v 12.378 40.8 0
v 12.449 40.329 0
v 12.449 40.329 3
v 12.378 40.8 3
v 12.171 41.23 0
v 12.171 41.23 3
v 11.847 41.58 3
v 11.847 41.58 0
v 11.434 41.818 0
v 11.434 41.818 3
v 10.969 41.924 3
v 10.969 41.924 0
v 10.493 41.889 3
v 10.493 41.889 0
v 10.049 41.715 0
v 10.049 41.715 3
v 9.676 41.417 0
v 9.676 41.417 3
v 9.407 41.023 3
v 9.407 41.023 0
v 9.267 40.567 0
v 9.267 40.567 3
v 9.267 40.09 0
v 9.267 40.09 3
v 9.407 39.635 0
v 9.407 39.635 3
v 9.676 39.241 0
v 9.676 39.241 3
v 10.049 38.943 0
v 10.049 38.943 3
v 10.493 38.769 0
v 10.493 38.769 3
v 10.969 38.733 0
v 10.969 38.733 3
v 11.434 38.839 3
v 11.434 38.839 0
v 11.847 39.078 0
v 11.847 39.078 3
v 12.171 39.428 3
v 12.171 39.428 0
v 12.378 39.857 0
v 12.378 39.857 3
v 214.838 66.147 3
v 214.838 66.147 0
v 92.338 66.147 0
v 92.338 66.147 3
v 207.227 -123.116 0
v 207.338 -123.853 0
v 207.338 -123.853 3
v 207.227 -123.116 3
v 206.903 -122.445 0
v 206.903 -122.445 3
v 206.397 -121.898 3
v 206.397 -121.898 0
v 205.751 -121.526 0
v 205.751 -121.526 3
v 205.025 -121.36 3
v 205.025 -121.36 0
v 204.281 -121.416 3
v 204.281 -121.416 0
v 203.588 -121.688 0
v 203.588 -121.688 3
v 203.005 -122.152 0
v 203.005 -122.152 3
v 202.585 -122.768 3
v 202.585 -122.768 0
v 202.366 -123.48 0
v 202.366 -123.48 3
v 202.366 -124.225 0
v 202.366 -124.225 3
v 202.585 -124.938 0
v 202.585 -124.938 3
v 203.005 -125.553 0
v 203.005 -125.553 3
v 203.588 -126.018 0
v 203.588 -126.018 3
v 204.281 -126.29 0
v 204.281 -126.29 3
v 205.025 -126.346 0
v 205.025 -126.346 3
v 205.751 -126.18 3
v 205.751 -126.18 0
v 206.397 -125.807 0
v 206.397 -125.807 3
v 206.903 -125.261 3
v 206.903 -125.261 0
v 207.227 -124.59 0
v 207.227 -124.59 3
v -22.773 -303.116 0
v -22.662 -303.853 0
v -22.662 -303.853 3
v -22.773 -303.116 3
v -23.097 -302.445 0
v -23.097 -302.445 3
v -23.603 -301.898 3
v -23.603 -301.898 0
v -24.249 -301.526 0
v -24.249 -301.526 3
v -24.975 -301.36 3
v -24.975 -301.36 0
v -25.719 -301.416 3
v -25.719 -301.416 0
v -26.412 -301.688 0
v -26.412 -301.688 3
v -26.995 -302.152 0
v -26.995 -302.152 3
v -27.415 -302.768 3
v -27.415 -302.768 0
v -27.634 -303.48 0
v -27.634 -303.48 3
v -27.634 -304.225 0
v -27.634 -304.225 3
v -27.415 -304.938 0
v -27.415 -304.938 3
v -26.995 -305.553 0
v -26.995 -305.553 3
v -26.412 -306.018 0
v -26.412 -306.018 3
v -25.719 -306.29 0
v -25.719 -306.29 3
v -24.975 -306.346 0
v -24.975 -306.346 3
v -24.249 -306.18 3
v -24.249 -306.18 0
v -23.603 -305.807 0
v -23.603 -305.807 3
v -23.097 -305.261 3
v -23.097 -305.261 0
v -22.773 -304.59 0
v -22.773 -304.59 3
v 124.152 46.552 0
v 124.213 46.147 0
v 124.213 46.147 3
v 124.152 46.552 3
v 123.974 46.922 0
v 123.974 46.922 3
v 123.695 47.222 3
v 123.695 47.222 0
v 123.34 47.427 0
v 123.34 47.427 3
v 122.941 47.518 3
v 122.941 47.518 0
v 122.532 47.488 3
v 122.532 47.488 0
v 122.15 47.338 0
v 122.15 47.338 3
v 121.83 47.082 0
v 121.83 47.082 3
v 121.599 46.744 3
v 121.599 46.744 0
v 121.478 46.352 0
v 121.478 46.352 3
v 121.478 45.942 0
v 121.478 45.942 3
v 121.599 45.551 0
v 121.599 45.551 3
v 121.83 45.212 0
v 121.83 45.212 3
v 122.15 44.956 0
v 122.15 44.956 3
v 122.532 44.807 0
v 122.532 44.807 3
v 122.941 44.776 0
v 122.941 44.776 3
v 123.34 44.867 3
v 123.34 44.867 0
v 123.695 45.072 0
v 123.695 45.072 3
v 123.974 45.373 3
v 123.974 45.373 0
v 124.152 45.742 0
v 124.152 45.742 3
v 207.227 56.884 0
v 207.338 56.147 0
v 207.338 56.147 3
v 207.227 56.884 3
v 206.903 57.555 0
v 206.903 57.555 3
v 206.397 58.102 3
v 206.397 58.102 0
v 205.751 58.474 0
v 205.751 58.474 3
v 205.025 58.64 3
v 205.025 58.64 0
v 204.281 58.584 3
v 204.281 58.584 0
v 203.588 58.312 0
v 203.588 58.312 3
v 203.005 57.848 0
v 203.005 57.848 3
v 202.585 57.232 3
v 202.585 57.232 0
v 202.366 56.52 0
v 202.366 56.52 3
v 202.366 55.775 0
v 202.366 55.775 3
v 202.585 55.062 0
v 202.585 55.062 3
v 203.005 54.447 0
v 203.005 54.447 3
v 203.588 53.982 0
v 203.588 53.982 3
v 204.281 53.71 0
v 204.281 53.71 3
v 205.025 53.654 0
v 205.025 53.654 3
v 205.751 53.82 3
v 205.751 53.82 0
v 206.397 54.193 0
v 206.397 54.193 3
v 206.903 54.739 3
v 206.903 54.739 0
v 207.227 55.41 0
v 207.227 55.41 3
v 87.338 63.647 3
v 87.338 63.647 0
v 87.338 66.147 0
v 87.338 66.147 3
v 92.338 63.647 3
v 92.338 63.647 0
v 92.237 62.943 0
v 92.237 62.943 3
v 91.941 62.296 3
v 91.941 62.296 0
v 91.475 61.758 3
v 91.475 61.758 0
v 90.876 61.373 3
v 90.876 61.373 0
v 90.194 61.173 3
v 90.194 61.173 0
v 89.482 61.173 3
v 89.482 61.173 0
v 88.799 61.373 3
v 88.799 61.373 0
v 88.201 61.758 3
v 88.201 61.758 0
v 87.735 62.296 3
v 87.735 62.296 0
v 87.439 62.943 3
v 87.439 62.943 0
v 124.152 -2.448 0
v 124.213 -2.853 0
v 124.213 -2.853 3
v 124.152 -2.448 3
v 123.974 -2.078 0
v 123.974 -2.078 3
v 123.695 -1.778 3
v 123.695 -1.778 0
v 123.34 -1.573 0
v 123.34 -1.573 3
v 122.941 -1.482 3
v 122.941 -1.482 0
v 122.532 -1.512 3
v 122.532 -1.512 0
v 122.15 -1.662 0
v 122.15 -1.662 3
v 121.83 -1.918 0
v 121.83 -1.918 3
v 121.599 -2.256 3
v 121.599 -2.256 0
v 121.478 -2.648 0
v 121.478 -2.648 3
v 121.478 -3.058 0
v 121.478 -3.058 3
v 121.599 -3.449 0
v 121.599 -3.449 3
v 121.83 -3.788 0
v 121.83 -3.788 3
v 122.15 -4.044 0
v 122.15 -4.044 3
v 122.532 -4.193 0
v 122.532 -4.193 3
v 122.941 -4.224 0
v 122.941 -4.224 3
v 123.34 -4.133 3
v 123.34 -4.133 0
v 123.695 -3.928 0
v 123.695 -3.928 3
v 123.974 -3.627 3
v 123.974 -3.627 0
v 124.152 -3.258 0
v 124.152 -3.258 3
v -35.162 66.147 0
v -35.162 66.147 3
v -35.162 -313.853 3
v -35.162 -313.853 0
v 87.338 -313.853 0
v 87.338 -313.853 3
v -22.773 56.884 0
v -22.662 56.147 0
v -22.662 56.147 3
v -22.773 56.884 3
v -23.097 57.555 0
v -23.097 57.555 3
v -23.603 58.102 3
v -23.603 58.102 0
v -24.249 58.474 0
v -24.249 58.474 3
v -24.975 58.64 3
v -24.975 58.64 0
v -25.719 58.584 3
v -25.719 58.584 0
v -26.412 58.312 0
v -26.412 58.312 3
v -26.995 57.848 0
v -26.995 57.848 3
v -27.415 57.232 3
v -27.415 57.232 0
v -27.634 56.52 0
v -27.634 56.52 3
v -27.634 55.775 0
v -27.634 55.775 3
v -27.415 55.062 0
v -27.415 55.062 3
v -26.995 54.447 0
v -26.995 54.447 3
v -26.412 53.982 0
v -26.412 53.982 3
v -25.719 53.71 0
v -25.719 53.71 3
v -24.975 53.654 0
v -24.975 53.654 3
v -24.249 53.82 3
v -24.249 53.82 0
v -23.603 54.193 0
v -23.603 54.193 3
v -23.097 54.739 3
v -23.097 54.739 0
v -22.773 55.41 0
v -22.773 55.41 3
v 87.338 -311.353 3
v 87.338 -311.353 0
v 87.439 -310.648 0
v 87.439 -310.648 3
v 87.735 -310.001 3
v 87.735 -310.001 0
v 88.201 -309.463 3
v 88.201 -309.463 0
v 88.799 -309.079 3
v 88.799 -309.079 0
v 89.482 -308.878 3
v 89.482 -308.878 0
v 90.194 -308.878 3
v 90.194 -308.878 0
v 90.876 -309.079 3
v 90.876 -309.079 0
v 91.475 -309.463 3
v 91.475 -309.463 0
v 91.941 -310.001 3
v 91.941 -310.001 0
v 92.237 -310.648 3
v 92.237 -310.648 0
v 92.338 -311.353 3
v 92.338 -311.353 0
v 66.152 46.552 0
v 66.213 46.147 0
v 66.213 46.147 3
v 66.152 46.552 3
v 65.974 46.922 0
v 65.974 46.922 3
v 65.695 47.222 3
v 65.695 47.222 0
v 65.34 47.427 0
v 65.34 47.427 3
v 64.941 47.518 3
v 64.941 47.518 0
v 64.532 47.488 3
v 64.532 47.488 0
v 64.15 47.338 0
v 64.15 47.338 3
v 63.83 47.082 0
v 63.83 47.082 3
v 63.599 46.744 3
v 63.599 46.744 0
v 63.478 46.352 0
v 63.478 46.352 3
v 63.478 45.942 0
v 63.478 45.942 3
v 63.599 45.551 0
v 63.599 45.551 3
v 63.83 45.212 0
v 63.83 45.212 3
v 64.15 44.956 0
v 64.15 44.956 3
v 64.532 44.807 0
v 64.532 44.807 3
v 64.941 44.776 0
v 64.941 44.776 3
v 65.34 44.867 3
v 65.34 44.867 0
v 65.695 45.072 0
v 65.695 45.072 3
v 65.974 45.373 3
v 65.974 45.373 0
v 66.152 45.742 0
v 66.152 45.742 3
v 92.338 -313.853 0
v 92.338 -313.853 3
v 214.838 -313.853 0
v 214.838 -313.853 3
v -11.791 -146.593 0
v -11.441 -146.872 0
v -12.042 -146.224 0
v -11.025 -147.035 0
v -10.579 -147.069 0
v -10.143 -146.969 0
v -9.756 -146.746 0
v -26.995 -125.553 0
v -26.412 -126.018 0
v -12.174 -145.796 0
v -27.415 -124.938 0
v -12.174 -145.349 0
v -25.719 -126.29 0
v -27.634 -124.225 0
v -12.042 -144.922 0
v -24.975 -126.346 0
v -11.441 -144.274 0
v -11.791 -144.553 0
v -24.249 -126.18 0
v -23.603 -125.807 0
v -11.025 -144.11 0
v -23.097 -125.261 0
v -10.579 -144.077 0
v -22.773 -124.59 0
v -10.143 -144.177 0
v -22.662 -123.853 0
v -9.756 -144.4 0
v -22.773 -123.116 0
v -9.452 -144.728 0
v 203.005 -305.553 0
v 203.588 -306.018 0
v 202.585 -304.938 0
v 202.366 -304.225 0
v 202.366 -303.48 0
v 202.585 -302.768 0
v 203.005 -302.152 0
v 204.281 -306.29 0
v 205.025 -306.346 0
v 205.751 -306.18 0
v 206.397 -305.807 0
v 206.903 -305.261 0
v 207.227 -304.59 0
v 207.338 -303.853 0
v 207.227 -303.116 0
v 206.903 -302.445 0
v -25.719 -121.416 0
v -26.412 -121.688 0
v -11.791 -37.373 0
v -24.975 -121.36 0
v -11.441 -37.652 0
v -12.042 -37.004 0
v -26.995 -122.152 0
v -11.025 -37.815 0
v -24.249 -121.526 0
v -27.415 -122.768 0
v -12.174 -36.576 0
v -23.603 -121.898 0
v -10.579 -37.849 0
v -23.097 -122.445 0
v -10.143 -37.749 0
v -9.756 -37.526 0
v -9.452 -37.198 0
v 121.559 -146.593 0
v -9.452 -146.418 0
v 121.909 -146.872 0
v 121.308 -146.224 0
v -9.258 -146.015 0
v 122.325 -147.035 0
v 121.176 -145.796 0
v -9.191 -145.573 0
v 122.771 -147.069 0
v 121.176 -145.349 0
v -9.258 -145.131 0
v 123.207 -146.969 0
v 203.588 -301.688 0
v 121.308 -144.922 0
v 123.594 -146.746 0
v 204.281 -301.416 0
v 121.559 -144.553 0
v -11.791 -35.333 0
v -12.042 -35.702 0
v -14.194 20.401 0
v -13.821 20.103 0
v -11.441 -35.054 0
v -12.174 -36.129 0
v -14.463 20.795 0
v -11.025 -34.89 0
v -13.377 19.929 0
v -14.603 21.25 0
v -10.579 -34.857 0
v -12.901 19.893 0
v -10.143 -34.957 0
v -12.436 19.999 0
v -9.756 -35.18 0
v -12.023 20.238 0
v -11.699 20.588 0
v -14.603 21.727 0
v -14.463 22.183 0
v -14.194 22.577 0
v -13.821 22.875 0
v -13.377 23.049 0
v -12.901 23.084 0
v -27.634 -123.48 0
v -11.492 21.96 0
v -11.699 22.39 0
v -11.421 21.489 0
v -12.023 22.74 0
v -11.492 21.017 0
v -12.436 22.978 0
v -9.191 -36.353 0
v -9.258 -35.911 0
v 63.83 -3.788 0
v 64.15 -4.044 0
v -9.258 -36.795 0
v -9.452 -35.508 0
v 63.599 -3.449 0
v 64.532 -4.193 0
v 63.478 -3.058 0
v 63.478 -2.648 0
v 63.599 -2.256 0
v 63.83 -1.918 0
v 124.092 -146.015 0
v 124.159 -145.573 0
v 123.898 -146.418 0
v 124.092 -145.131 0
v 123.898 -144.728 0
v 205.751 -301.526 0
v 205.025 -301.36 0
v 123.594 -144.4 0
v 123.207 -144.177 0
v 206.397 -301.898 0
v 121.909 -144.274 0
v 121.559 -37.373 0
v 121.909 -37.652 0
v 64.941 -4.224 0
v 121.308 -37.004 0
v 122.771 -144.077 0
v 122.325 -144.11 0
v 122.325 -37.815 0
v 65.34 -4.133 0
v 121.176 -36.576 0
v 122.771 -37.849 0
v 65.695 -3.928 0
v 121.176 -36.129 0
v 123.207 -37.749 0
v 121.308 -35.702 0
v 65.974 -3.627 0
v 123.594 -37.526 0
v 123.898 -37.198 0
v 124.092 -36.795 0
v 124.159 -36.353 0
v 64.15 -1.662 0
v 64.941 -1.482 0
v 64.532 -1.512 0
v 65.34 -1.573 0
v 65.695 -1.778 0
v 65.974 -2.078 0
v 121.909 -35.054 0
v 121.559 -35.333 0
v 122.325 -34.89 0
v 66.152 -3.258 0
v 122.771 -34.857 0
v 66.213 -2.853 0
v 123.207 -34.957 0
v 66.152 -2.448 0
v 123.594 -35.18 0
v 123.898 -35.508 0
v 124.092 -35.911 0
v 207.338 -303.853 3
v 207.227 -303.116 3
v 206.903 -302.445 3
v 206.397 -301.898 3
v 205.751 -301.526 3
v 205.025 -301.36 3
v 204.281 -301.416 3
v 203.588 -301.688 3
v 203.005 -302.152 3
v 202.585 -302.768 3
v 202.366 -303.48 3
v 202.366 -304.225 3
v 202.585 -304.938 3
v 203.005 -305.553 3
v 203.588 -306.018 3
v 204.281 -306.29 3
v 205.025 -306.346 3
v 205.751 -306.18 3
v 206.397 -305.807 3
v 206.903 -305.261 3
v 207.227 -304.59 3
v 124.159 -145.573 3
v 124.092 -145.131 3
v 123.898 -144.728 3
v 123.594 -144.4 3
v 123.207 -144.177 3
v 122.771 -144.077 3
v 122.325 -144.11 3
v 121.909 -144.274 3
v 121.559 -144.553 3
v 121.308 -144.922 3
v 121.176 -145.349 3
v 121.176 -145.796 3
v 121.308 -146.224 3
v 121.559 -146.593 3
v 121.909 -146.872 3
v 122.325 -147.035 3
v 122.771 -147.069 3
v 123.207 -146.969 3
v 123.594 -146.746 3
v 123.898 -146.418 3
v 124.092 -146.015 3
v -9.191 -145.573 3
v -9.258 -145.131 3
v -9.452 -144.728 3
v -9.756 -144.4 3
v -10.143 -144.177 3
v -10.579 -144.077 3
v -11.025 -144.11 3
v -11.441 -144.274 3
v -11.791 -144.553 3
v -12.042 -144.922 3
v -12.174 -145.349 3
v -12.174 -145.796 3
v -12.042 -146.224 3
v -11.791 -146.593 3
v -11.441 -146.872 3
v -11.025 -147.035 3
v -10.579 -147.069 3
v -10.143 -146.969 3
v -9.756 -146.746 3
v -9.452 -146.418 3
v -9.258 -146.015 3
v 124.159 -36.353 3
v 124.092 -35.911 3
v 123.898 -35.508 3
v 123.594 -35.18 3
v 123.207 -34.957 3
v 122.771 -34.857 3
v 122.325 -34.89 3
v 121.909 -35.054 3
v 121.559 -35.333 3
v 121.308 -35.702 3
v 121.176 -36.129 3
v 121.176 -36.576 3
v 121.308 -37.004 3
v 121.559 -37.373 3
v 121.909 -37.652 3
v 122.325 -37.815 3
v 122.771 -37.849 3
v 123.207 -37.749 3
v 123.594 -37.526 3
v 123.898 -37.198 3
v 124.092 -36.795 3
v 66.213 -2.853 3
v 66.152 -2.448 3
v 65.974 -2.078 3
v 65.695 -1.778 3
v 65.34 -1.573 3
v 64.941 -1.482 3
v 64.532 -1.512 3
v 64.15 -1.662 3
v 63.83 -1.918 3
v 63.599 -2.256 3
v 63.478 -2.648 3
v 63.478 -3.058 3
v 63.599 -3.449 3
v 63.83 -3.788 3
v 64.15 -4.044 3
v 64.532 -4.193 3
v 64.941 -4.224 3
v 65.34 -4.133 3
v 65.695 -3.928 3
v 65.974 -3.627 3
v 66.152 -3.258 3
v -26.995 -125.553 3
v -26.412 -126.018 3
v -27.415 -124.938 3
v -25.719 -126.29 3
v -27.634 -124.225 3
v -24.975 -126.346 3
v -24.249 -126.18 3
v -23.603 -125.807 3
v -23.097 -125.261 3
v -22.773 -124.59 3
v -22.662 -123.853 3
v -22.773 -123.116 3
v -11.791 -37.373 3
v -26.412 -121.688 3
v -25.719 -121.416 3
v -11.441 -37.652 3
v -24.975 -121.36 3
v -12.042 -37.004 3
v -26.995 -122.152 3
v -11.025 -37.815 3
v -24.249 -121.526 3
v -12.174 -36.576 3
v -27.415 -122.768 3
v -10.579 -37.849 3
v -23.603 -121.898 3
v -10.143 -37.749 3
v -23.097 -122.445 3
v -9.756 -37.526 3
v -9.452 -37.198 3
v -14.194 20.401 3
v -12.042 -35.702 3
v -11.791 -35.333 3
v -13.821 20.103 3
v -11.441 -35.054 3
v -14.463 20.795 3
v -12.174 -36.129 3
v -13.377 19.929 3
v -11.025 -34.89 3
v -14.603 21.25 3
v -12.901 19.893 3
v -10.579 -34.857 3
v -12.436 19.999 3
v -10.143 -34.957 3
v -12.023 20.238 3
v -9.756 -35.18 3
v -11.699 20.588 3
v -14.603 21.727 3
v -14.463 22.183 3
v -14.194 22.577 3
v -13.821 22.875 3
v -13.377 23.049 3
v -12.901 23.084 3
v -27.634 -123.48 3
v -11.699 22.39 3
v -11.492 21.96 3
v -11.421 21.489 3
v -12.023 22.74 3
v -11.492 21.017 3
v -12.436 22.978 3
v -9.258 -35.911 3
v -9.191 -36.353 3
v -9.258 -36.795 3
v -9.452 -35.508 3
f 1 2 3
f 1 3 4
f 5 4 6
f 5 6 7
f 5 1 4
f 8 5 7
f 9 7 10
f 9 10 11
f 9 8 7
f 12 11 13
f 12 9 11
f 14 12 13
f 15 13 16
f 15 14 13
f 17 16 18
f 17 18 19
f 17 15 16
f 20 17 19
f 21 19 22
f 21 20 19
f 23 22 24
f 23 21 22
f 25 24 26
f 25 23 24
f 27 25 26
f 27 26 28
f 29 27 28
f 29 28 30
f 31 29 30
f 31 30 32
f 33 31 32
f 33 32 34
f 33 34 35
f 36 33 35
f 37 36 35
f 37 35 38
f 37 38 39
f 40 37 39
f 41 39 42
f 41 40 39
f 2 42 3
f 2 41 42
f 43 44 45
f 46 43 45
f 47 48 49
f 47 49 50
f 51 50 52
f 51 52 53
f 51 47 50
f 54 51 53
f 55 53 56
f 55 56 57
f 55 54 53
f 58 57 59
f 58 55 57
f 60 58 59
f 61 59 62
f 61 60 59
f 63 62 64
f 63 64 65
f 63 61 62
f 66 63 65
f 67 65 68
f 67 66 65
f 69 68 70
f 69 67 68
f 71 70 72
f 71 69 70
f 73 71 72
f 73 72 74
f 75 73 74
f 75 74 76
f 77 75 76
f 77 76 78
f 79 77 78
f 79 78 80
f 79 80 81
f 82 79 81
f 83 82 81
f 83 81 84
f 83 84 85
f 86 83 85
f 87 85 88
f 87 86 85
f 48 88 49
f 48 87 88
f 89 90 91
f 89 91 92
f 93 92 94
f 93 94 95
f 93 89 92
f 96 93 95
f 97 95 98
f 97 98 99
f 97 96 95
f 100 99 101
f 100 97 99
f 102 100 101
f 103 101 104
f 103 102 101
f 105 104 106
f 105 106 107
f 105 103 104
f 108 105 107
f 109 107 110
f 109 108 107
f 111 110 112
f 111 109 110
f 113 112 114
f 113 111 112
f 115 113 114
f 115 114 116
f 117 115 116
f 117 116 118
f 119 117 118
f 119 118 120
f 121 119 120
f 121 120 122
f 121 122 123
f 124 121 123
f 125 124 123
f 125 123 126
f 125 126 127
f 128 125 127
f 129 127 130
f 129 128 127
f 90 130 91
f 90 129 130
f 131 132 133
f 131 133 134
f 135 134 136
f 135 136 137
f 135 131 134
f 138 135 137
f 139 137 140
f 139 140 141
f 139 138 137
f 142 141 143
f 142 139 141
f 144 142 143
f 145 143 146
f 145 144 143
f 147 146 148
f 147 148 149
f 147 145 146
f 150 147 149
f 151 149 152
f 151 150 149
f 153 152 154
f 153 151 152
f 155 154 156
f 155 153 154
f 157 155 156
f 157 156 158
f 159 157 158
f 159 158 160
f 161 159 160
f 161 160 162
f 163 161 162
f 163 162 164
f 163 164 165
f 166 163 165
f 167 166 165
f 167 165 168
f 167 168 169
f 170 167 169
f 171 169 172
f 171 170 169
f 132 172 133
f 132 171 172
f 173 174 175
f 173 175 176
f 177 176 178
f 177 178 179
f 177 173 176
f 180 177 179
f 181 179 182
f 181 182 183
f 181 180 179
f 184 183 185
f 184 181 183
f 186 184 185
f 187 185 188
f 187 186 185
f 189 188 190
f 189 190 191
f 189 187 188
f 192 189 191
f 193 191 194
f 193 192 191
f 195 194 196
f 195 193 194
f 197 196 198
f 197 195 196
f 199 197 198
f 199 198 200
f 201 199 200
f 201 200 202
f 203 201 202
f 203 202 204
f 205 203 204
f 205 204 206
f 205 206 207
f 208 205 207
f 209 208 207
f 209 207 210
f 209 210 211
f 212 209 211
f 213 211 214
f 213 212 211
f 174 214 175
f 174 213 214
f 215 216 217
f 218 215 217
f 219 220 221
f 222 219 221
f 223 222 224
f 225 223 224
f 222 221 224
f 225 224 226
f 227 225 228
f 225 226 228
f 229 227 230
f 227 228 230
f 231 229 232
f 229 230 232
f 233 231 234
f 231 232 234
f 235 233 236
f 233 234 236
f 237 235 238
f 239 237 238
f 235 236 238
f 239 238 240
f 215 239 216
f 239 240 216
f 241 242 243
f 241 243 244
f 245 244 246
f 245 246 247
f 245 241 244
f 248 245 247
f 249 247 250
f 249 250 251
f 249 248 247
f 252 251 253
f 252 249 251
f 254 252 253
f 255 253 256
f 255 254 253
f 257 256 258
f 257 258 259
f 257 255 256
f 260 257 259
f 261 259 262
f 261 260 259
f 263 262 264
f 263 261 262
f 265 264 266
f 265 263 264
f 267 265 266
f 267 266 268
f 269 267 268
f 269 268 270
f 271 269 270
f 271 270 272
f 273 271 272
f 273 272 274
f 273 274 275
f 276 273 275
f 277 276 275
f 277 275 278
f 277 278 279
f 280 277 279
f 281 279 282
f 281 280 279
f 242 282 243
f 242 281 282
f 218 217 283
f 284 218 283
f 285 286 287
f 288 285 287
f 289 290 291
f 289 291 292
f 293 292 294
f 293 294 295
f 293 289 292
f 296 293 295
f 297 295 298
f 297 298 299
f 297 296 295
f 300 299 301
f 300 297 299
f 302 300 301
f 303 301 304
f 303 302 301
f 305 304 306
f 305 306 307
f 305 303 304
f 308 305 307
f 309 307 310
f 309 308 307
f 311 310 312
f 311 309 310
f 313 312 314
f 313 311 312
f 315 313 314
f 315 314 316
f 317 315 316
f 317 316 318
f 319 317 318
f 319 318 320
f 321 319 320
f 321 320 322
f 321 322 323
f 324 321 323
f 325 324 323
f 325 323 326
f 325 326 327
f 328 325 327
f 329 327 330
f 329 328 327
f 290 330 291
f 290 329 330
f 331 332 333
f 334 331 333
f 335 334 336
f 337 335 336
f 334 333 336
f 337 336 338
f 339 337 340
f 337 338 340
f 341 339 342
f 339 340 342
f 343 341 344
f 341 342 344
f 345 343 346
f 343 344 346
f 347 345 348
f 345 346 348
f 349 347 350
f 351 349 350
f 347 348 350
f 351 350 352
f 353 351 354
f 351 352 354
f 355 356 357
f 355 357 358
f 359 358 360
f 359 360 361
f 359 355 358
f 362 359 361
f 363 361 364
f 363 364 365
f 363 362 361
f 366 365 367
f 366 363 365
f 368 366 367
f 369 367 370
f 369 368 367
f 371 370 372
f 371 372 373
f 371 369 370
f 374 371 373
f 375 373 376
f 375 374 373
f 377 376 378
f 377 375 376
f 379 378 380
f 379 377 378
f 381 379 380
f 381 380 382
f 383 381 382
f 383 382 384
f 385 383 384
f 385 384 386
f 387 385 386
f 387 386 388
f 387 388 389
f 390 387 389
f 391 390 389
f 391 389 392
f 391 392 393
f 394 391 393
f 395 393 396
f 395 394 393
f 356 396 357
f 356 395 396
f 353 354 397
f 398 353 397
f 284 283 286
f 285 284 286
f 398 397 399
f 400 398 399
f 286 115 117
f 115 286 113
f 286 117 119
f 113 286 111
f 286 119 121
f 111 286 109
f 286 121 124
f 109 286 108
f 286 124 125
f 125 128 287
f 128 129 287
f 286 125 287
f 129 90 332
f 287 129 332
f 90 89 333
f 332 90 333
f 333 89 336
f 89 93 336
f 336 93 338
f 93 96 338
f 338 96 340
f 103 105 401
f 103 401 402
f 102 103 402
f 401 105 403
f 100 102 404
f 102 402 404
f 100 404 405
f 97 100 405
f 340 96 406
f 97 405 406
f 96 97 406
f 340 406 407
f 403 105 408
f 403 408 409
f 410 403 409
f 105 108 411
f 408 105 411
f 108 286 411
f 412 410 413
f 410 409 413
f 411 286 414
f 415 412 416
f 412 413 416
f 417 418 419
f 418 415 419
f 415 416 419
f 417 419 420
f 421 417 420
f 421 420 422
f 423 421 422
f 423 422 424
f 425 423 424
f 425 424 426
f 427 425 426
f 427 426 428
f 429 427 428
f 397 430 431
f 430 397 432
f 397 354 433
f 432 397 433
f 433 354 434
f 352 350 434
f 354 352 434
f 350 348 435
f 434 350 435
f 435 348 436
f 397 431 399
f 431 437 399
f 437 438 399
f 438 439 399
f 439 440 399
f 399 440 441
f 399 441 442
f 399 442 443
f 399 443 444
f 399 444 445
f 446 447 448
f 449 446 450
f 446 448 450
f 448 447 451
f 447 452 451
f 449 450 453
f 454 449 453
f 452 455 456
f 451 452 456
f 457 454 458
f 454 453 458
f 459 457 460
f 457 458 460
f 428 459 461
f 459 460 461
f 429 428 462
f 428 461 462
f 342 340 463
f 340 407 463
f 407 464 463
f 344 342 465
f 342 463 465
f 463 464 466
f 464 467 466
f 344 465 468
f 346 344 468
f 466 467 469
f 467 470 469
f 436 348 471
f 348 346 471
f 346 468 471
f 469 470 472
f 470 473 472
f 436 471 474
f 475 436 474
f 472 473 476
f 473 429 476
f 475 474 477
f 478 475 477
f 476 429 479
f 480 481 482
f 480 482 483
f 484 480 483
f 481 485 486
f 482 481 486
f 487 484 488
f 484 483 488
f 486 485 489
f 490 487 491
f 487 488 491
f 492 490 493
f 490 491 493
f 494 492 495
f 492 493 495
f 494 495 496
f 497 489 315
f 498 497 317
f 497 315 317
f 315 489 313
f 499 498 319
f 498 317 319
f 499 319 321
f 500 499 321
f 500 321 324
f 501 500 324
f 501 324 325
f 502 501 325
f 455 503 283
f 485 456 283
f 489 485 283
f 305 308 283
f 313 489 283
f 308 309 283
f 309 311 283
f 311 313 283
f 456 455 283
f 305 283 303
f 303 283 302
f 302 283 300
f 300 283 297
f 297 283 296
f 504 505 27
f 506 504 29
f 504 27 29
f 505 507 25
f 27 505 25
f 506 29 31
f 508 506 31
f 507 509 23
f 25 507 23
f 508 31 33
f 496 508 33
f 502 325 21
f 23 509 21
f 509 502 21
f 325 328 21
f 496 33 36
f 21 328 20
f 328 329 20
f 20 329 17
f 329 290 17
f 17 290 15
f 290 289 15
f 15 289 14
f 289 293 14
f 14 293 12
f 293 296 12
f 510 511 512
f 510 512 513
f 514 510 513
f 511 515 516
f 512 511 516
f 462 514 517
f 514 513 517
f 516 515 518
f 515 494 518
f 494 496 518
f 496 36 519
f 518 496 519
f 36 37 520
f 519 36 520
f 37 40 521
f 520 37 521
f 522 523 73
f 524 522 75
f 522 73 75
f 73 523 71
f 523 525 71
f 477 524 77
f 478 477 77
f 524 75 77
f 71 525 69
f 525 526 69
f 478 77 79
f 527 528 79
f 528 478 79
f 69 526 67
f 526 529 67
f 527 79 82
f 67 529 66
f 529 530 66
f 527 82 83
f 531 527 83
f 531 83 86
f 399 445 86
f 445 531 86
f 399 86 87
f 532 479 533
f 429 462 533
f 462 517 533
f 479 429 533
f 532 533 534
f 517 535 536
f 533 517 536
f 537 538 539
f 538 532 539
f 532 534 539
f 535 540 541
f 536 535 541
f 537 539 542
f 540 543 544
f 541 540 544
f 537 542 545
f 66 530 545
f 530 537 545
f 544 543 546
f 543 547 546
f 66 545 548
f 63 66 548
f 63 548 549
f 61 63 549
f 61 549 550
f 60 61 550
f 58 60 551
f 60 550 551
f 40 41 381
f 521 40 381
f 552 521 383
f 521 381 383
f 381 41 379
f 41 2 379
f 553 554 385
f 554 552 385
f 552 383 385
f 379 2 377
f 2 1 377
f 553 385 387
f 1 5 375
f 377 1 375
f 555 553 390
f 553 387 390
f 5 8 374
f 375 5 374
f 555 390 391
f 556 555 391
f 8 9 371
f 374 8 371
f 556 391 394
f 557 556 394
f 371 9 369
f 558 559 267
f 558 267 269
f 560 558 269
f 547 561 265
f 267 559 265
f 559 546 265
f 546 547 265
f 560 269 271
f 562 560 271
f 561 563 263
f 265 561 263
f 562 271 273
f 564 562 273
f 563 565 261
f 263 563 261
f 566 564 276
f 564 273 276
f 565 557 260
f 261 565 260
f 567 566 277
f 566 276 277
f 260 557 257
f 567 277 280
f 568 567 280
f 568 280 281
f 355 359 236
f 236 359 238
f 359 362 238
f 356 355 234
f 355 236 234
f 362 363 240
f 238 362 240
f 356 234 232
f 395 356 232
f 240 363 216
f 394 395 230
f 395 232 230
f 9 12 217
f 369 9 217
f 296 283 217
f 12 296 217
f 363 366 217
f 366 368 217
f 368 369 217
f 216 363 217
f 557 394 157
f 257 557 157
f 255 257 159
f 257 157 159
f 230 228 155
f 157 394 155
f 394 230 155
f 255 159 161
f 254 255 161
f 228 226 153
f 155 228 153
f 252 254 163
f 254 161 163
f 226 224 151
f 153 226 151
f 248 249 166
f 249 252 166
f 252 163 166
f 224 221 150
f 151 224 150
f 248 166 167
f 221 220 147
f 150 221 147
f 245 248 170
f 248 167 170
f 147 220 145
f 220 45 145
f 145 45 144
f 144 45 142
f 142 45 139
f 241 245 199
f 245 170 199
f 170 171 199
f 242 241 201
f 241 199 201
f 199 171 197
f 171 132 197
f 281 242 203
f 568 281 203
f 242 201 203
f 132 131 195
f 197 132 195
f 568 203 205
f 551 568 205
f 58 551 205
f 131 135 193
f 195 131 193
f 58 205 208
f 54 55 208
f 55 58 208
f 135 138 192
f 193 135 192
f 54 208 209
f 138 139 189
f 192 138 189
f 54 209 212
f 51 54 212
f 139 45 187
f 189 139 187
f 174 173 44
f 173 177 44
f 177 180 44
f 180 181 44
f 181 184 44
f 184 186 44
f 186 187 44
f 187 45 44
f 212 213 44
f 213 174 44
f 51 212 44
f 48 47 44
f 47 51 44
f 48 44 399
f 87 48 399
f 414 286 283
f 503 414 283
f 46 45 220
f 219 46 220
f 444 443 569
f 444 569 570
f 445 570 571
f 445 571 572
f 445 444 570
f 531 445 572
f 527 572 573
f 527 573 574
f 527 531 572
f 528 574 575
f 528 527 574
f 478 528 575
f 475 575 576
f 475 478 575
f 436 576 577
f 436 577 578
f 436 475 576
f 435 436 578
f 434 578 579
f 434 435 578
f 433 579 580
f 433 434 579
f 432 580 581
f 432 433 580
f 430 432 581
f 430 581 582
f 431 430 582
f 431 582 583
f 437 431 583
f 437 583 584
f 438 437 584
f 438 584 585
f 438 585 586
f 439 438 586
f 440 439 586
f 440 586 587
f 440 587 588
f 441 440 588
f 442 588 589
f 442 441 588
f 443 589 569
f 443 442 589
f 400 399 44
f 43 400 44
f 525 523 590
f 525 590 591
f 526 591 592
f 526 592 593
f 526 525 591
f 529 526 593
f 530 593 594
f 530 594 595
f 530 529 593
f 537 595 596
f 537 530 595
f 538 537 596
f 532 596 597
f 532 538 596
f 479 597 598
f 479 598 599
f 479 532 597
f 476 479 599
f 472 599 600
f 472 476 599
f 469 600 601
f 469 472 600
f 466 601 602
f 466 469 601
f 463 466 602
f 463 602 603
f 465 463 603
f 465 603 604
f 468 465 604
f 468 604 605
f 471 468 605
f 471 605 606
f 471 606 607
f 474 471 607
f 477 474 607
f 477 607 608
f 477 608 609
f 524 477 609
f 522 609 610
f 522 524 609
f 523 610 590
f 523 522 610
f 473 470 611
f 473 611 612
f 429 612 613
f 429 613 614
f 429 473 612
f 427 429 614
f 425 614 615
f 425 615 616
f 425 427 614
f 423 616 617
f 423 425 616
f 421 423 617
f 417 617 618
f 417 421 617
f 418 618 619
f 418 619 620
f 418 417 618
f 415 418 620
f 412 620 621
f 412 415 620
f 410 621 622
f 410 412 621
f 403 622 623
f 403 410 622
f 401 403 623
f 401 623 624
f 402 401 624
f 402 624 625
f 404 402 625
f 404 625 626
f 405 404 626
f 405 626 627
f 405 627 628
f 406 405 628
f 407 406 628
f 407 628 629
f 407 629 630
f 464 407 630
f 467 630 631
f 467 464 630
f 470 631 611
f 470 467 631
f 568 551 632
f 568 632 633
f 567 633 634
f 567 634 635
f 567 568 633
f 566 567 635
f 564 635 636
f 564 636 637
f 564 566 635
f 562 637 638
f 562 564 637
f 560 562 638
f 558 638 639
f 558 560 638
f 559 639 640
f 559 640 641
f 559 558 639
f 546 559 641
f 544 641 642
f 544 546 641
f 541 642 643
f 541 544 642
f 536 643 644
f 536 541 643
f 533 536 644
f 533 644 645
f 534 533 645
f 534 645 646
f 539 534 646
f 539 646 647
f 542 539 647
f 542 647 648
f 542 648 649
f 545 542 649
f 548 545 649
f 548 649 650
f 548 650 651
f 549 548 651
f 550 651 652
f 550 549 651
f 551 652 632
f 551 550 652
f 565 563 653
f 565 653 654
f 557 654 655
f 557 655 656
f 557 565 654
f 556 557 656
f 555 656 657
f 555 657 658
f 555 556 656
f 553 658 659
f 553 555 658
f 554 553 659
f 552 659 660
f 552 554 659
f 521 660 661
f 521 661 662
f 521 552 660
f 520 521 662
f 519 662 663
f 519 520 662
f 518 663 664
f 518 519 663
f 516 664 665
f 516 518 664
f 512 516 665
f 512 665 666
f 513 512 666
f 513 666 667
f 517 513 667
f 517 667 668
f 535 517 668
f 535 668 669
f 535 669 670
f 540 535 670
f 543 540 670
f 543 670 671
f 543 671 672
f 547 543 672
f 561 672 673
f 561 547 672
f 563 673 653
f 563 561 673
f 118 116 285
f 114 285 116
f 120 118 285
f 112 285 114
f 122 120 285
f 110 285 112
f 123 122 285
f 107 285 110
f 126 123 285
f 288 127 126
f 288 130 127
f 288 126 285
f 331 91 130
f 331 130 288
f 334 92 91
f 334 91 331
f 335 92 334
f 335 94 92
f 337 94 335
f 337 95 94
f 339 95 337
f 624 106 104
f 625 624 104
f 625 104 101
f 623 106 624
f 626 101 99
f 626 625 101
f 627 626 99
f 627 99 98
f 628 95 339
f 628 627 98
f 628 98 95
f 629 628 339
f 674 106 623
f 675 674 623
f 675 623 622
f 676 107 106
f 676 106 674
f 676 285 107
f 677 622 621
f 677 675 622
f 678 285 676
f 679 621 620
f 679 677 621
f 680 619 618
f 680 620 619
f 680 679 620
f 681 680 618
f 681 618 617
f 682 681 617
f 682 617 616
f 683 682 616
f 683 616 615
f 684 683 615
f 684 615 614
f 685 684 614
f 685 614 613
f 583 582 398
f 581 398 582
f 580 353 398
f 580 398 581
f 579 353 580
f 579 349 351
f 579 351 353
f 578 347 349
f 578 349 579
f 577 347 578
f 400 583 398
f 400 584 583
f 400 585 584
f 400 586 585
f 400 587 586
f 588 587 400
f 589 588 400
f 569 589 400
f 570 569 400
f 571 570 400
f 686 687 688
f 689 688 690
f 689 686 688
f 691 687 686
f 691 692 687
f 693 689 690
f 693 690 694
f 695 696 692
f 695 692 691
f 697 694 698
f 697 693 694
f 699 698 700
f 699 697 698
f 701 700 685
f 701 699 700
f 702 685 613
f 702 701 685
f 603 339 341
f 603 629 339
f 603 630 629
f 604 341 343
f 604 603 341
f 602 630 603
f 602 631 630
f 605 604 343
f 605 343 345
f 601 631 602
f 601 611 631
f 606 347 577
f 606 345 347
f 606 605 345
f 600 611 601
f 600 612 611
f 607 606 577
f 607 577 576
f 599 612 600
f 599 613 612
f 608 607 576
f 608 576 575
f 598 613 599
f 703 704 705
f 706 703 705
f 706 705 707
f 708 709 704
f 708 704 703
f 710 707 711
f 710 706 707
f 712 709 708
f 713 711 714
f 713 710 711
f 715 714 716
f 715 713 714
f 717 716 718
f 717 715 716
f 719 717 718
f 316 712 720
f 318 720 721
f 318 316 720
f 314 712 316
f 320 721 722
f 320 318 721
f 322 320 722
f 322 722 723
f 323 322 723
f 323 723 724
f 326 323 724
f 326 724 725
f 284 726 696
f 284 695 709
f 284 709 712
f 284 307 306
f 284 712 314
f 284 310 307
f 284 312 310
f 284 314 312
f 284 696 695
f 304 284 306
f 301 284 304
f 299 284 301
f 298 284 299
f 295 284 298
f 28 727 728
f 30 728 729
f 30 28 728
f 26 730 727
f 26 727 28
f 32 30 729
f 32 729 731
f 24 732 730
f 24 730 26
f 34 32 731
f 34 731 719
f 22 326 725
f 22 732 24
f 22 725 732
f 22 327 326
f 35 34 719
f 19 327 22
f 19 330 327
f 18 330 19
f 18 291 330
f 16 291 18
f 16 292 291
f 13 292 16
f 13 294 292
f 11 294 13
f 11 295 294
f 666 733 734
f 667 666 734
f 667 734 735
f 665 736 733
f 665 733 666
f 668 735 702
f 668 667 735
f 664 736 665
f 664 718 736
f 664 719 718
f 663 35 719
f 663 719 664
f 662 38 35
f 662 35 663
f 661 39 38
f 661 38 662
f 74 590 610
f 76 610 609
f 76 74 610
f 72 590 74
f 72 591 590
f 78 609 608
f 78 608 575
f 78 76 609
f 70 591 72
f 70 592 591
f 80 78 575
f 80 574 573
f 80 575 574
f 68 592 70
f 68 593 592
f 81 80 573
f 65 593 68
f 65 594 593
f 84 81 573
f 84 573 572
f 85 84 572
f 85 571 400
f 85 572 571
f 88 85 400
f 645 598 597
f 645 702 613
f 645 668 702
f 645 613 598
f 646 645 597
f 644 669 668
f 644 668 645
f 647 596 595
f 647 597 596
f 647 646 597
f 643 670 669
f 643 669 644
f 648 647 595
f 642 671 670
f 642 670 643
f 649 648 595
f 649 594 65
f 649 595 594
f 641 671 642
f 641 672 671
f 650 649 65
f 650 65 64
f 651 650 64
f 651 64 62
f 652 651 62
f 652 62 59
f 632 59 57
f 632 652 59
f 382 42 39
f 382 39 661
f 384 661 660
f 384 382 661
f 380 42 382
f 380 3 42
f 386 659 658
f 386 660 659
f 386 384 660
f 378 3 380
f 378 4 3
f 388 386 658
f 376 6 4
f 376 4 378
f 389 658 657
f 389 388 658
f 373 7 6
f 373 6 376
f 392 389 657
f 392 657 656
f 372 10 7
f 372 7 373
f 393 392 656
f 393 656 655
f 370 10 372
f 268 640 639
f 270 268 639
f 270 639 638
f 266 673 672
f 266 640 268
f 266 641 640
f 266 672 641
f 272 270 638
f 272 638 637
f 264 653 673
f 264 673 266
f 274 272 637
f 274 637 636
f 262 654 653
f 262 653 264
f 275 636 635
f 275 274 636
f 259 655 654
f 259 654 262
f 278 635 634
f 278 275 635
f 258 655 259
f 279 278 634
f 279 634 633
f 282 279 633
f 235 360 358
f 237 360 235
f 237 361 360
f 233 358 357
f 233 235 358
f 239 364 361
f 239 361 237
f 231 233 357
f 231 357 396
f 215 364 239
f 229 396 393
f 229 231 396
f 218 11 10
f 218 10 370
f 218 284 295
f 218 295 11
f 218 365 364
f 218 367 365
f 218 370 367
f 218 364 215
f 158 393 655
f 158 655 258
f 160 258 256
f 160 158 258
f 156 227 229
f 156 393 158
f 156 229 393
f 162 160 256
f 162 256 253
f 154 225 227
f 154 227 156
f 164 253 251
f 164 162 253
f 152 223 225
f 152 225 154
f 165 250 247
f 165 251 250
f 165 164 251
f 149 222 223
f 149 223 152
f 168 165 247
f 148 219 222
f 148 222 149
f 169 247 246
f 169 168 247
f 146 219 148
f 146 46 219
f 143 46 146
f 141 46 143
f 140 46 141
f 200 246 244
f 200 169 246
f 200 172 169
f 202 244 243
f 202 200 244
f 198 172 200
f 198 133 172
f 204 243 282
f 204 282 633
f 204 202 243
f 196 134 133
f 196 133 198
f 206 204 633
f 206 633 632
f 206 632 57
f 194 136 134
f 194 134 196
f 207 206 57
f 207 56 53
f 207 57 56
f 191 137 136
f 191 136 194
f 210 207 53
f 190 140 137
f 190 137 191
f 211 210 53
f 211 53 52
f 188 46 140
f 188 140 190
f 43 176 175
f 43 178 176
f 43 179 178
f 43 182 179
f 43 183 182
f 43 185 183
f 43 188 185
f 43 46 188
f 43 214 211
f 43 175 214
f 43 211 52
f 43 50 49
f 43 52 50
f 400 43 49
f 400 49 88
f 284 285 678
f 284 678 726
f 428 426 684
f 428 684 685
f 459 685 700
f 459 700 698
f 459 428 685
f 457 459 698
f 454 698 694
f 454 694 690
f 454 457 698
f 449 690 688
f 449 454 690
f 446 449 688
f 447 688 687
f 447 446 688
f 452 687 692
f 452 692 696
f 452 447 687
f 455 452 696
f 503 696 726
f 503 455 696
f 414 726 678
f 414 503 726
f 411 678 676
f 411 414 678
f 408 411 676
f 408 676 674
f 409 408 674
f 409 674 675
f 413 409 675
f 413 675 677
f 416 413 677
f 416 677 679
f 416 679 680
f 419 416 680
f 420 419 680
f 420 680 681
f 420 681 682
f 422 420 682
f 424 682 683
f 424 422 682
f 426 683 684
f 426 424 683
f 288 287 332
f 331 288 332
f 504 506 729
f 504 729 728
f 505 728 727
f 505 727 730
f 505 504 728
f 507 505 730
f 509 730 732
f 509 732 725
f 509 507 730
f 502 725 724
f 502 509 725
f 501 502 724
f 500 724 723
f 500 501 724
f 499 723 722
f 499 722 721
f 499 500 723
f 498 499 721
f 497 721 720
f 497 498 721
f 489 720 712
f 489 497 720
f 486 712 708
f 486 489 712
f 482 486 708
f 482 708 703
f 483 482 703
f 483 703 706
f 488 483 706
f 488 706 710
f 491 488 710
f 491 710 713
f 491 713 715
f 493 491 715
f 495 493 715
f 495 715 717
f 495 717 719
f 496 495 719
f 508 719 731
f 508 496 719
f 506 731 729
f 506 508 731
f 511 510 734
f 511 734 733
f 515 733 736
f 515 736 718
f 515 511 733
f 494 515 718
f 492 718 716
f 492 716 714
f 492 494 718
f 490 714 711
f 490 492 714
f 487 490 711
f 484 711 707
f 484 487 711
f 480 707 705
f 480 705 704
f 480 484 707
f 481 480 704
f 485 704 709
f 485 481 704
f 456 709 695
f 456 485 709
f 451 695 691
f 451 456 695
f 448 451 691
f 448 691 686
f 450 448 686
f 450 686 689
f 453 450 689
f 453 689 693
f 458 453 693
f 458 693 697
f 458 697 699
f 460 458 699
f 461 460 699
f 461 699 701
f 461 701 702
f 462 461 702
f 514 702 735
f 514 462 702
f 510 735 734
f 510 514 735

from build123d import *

# Parameters (mm, degrees)
ESQUISSE1_R        = 1.375
ESQUISSE1_R_2      = 1.5
ESQUISSE1_R_3      = 2.5
ESQUISSE1_R_4      = 1.6
BOSS_EXTRU_1_DEPTH = 3


with BuildPart() as part:
    # Esquisse1 → Boss.-Extru.1 (new body)
    with BuildSketch(Plane.XY):
        with BuildLine():
            Line((92.337784558, -311.352829028), (92.337784558, -313.852829028))
            Line((92.337784558, -313.852829028), (214.837784558, -313.852829028))
            Line((214.837784558, -313.852829028), (214.837784558, 66.147170972))
            Line((214.837784558, 66.147170972), (92.337784558, 66.147170972))
            Line((92.337784558, 66.147170972), (92.337784558, 63.647170972))
            ThreePointArc((92.337784558, 63.647170972), (89.837784558, 61.147170972), (87.337784558, 63.647170972))
            Line((87.337784558, 63.647170972), (87.337784558, 66.147170972))
            Line((87.337784558, 66.147170972), (-35.162215442, 66.147170972))
            Line((-35.162215442, 66.147170972), (-35.162215442, -313.852829028))
            Line((-35.162215442, -313.852829028), (87.337784558, -313.852829028))
            Line((87.337784558, -313.852829028), (87.337784558, -311.352829028))
            ThreePointArc((87.337784558, -311.352829028), (89.837784558, -308.852829028), (92.337784558, -311.352829028))
        make_face()
        with Locations((64.837784558, 46.147170972)):
            Circle(ESQUISSE1_R, mode=Mode.SUBTRACT)
        with Locations((122.837784558, 46.147170972)):
            Circle(ESQUISSE1_R, mode=Mode.SUBTRACT)
        with Locations((64.837784558, -2.852829028)):
            Circle(ESQUISSE1_R, mode=Mode.SUBTRACT)
        with Locations((122.837784558, -2.852829028)):
            Circle(ESQUISSE1_R, mode=Mode.SUBTRACT)
        with Locations((-10.69098659, -36.352829028)):
            Circle(ESQUISSE1_R_2, mode=Mode.SUBTRACT)
        with Locations((122.65901341, -36.352829028)):
            Circle(ESQUISSE1_R_2, mode=Mode.SUBTRACT)
        with Locations((122.65901341, -145.572829028)):
            Circle(ESQUISSE1_R_2, mode=Mode.SUBTRACT)
        with Locations((-10.69098659, -145.572829028)):
            Circle(ESQUISSE1_R_2, mode=Mode.SUBTRACT)
        with Locations((-25.162215442, 56.147170972)):
            Circle(ESQUISSE1_R_3, mode=Mode.SUBTRACT)
        with Locations((204.837784558, 56.147170972)):
            Circle(ESQUISSE1_R_3, mode=Mode.SUBTRACT)
        with Locations((204.837784558, -303.852829028)):
            Circle(ESQUISSE1_R_3, mode=Mode.SUBTRACT)
        with Locations((-25.162215442, -303.852829028)):
            Circle(ESQUISSE1_R_3, mode=Mode.SUBTRACT)
        with Locations((204.837784558, -123.852829028)):
            Circle(ESQUISSE1_R_3, mode=Mode.SUBTRACT)
        with Locations((-25.162215442, -123.852829028)):
            Circle(ESQUISSE1_R_3, mode=Mode.SUBTRACT)
        with Locations((10.84901341, 40.328880037)):
            Circle(ESQUISSE1_R_4, mode=Mode.SUBTRACT)
        with Locations((-13.02098659, 21.488880037)):
            Circle(ESQUISSE1_R_4, mode=Mode.SUBTRACT)
    extrude(amount=BOSS_EXTRU_1_DEPTH)


solid = part.part
